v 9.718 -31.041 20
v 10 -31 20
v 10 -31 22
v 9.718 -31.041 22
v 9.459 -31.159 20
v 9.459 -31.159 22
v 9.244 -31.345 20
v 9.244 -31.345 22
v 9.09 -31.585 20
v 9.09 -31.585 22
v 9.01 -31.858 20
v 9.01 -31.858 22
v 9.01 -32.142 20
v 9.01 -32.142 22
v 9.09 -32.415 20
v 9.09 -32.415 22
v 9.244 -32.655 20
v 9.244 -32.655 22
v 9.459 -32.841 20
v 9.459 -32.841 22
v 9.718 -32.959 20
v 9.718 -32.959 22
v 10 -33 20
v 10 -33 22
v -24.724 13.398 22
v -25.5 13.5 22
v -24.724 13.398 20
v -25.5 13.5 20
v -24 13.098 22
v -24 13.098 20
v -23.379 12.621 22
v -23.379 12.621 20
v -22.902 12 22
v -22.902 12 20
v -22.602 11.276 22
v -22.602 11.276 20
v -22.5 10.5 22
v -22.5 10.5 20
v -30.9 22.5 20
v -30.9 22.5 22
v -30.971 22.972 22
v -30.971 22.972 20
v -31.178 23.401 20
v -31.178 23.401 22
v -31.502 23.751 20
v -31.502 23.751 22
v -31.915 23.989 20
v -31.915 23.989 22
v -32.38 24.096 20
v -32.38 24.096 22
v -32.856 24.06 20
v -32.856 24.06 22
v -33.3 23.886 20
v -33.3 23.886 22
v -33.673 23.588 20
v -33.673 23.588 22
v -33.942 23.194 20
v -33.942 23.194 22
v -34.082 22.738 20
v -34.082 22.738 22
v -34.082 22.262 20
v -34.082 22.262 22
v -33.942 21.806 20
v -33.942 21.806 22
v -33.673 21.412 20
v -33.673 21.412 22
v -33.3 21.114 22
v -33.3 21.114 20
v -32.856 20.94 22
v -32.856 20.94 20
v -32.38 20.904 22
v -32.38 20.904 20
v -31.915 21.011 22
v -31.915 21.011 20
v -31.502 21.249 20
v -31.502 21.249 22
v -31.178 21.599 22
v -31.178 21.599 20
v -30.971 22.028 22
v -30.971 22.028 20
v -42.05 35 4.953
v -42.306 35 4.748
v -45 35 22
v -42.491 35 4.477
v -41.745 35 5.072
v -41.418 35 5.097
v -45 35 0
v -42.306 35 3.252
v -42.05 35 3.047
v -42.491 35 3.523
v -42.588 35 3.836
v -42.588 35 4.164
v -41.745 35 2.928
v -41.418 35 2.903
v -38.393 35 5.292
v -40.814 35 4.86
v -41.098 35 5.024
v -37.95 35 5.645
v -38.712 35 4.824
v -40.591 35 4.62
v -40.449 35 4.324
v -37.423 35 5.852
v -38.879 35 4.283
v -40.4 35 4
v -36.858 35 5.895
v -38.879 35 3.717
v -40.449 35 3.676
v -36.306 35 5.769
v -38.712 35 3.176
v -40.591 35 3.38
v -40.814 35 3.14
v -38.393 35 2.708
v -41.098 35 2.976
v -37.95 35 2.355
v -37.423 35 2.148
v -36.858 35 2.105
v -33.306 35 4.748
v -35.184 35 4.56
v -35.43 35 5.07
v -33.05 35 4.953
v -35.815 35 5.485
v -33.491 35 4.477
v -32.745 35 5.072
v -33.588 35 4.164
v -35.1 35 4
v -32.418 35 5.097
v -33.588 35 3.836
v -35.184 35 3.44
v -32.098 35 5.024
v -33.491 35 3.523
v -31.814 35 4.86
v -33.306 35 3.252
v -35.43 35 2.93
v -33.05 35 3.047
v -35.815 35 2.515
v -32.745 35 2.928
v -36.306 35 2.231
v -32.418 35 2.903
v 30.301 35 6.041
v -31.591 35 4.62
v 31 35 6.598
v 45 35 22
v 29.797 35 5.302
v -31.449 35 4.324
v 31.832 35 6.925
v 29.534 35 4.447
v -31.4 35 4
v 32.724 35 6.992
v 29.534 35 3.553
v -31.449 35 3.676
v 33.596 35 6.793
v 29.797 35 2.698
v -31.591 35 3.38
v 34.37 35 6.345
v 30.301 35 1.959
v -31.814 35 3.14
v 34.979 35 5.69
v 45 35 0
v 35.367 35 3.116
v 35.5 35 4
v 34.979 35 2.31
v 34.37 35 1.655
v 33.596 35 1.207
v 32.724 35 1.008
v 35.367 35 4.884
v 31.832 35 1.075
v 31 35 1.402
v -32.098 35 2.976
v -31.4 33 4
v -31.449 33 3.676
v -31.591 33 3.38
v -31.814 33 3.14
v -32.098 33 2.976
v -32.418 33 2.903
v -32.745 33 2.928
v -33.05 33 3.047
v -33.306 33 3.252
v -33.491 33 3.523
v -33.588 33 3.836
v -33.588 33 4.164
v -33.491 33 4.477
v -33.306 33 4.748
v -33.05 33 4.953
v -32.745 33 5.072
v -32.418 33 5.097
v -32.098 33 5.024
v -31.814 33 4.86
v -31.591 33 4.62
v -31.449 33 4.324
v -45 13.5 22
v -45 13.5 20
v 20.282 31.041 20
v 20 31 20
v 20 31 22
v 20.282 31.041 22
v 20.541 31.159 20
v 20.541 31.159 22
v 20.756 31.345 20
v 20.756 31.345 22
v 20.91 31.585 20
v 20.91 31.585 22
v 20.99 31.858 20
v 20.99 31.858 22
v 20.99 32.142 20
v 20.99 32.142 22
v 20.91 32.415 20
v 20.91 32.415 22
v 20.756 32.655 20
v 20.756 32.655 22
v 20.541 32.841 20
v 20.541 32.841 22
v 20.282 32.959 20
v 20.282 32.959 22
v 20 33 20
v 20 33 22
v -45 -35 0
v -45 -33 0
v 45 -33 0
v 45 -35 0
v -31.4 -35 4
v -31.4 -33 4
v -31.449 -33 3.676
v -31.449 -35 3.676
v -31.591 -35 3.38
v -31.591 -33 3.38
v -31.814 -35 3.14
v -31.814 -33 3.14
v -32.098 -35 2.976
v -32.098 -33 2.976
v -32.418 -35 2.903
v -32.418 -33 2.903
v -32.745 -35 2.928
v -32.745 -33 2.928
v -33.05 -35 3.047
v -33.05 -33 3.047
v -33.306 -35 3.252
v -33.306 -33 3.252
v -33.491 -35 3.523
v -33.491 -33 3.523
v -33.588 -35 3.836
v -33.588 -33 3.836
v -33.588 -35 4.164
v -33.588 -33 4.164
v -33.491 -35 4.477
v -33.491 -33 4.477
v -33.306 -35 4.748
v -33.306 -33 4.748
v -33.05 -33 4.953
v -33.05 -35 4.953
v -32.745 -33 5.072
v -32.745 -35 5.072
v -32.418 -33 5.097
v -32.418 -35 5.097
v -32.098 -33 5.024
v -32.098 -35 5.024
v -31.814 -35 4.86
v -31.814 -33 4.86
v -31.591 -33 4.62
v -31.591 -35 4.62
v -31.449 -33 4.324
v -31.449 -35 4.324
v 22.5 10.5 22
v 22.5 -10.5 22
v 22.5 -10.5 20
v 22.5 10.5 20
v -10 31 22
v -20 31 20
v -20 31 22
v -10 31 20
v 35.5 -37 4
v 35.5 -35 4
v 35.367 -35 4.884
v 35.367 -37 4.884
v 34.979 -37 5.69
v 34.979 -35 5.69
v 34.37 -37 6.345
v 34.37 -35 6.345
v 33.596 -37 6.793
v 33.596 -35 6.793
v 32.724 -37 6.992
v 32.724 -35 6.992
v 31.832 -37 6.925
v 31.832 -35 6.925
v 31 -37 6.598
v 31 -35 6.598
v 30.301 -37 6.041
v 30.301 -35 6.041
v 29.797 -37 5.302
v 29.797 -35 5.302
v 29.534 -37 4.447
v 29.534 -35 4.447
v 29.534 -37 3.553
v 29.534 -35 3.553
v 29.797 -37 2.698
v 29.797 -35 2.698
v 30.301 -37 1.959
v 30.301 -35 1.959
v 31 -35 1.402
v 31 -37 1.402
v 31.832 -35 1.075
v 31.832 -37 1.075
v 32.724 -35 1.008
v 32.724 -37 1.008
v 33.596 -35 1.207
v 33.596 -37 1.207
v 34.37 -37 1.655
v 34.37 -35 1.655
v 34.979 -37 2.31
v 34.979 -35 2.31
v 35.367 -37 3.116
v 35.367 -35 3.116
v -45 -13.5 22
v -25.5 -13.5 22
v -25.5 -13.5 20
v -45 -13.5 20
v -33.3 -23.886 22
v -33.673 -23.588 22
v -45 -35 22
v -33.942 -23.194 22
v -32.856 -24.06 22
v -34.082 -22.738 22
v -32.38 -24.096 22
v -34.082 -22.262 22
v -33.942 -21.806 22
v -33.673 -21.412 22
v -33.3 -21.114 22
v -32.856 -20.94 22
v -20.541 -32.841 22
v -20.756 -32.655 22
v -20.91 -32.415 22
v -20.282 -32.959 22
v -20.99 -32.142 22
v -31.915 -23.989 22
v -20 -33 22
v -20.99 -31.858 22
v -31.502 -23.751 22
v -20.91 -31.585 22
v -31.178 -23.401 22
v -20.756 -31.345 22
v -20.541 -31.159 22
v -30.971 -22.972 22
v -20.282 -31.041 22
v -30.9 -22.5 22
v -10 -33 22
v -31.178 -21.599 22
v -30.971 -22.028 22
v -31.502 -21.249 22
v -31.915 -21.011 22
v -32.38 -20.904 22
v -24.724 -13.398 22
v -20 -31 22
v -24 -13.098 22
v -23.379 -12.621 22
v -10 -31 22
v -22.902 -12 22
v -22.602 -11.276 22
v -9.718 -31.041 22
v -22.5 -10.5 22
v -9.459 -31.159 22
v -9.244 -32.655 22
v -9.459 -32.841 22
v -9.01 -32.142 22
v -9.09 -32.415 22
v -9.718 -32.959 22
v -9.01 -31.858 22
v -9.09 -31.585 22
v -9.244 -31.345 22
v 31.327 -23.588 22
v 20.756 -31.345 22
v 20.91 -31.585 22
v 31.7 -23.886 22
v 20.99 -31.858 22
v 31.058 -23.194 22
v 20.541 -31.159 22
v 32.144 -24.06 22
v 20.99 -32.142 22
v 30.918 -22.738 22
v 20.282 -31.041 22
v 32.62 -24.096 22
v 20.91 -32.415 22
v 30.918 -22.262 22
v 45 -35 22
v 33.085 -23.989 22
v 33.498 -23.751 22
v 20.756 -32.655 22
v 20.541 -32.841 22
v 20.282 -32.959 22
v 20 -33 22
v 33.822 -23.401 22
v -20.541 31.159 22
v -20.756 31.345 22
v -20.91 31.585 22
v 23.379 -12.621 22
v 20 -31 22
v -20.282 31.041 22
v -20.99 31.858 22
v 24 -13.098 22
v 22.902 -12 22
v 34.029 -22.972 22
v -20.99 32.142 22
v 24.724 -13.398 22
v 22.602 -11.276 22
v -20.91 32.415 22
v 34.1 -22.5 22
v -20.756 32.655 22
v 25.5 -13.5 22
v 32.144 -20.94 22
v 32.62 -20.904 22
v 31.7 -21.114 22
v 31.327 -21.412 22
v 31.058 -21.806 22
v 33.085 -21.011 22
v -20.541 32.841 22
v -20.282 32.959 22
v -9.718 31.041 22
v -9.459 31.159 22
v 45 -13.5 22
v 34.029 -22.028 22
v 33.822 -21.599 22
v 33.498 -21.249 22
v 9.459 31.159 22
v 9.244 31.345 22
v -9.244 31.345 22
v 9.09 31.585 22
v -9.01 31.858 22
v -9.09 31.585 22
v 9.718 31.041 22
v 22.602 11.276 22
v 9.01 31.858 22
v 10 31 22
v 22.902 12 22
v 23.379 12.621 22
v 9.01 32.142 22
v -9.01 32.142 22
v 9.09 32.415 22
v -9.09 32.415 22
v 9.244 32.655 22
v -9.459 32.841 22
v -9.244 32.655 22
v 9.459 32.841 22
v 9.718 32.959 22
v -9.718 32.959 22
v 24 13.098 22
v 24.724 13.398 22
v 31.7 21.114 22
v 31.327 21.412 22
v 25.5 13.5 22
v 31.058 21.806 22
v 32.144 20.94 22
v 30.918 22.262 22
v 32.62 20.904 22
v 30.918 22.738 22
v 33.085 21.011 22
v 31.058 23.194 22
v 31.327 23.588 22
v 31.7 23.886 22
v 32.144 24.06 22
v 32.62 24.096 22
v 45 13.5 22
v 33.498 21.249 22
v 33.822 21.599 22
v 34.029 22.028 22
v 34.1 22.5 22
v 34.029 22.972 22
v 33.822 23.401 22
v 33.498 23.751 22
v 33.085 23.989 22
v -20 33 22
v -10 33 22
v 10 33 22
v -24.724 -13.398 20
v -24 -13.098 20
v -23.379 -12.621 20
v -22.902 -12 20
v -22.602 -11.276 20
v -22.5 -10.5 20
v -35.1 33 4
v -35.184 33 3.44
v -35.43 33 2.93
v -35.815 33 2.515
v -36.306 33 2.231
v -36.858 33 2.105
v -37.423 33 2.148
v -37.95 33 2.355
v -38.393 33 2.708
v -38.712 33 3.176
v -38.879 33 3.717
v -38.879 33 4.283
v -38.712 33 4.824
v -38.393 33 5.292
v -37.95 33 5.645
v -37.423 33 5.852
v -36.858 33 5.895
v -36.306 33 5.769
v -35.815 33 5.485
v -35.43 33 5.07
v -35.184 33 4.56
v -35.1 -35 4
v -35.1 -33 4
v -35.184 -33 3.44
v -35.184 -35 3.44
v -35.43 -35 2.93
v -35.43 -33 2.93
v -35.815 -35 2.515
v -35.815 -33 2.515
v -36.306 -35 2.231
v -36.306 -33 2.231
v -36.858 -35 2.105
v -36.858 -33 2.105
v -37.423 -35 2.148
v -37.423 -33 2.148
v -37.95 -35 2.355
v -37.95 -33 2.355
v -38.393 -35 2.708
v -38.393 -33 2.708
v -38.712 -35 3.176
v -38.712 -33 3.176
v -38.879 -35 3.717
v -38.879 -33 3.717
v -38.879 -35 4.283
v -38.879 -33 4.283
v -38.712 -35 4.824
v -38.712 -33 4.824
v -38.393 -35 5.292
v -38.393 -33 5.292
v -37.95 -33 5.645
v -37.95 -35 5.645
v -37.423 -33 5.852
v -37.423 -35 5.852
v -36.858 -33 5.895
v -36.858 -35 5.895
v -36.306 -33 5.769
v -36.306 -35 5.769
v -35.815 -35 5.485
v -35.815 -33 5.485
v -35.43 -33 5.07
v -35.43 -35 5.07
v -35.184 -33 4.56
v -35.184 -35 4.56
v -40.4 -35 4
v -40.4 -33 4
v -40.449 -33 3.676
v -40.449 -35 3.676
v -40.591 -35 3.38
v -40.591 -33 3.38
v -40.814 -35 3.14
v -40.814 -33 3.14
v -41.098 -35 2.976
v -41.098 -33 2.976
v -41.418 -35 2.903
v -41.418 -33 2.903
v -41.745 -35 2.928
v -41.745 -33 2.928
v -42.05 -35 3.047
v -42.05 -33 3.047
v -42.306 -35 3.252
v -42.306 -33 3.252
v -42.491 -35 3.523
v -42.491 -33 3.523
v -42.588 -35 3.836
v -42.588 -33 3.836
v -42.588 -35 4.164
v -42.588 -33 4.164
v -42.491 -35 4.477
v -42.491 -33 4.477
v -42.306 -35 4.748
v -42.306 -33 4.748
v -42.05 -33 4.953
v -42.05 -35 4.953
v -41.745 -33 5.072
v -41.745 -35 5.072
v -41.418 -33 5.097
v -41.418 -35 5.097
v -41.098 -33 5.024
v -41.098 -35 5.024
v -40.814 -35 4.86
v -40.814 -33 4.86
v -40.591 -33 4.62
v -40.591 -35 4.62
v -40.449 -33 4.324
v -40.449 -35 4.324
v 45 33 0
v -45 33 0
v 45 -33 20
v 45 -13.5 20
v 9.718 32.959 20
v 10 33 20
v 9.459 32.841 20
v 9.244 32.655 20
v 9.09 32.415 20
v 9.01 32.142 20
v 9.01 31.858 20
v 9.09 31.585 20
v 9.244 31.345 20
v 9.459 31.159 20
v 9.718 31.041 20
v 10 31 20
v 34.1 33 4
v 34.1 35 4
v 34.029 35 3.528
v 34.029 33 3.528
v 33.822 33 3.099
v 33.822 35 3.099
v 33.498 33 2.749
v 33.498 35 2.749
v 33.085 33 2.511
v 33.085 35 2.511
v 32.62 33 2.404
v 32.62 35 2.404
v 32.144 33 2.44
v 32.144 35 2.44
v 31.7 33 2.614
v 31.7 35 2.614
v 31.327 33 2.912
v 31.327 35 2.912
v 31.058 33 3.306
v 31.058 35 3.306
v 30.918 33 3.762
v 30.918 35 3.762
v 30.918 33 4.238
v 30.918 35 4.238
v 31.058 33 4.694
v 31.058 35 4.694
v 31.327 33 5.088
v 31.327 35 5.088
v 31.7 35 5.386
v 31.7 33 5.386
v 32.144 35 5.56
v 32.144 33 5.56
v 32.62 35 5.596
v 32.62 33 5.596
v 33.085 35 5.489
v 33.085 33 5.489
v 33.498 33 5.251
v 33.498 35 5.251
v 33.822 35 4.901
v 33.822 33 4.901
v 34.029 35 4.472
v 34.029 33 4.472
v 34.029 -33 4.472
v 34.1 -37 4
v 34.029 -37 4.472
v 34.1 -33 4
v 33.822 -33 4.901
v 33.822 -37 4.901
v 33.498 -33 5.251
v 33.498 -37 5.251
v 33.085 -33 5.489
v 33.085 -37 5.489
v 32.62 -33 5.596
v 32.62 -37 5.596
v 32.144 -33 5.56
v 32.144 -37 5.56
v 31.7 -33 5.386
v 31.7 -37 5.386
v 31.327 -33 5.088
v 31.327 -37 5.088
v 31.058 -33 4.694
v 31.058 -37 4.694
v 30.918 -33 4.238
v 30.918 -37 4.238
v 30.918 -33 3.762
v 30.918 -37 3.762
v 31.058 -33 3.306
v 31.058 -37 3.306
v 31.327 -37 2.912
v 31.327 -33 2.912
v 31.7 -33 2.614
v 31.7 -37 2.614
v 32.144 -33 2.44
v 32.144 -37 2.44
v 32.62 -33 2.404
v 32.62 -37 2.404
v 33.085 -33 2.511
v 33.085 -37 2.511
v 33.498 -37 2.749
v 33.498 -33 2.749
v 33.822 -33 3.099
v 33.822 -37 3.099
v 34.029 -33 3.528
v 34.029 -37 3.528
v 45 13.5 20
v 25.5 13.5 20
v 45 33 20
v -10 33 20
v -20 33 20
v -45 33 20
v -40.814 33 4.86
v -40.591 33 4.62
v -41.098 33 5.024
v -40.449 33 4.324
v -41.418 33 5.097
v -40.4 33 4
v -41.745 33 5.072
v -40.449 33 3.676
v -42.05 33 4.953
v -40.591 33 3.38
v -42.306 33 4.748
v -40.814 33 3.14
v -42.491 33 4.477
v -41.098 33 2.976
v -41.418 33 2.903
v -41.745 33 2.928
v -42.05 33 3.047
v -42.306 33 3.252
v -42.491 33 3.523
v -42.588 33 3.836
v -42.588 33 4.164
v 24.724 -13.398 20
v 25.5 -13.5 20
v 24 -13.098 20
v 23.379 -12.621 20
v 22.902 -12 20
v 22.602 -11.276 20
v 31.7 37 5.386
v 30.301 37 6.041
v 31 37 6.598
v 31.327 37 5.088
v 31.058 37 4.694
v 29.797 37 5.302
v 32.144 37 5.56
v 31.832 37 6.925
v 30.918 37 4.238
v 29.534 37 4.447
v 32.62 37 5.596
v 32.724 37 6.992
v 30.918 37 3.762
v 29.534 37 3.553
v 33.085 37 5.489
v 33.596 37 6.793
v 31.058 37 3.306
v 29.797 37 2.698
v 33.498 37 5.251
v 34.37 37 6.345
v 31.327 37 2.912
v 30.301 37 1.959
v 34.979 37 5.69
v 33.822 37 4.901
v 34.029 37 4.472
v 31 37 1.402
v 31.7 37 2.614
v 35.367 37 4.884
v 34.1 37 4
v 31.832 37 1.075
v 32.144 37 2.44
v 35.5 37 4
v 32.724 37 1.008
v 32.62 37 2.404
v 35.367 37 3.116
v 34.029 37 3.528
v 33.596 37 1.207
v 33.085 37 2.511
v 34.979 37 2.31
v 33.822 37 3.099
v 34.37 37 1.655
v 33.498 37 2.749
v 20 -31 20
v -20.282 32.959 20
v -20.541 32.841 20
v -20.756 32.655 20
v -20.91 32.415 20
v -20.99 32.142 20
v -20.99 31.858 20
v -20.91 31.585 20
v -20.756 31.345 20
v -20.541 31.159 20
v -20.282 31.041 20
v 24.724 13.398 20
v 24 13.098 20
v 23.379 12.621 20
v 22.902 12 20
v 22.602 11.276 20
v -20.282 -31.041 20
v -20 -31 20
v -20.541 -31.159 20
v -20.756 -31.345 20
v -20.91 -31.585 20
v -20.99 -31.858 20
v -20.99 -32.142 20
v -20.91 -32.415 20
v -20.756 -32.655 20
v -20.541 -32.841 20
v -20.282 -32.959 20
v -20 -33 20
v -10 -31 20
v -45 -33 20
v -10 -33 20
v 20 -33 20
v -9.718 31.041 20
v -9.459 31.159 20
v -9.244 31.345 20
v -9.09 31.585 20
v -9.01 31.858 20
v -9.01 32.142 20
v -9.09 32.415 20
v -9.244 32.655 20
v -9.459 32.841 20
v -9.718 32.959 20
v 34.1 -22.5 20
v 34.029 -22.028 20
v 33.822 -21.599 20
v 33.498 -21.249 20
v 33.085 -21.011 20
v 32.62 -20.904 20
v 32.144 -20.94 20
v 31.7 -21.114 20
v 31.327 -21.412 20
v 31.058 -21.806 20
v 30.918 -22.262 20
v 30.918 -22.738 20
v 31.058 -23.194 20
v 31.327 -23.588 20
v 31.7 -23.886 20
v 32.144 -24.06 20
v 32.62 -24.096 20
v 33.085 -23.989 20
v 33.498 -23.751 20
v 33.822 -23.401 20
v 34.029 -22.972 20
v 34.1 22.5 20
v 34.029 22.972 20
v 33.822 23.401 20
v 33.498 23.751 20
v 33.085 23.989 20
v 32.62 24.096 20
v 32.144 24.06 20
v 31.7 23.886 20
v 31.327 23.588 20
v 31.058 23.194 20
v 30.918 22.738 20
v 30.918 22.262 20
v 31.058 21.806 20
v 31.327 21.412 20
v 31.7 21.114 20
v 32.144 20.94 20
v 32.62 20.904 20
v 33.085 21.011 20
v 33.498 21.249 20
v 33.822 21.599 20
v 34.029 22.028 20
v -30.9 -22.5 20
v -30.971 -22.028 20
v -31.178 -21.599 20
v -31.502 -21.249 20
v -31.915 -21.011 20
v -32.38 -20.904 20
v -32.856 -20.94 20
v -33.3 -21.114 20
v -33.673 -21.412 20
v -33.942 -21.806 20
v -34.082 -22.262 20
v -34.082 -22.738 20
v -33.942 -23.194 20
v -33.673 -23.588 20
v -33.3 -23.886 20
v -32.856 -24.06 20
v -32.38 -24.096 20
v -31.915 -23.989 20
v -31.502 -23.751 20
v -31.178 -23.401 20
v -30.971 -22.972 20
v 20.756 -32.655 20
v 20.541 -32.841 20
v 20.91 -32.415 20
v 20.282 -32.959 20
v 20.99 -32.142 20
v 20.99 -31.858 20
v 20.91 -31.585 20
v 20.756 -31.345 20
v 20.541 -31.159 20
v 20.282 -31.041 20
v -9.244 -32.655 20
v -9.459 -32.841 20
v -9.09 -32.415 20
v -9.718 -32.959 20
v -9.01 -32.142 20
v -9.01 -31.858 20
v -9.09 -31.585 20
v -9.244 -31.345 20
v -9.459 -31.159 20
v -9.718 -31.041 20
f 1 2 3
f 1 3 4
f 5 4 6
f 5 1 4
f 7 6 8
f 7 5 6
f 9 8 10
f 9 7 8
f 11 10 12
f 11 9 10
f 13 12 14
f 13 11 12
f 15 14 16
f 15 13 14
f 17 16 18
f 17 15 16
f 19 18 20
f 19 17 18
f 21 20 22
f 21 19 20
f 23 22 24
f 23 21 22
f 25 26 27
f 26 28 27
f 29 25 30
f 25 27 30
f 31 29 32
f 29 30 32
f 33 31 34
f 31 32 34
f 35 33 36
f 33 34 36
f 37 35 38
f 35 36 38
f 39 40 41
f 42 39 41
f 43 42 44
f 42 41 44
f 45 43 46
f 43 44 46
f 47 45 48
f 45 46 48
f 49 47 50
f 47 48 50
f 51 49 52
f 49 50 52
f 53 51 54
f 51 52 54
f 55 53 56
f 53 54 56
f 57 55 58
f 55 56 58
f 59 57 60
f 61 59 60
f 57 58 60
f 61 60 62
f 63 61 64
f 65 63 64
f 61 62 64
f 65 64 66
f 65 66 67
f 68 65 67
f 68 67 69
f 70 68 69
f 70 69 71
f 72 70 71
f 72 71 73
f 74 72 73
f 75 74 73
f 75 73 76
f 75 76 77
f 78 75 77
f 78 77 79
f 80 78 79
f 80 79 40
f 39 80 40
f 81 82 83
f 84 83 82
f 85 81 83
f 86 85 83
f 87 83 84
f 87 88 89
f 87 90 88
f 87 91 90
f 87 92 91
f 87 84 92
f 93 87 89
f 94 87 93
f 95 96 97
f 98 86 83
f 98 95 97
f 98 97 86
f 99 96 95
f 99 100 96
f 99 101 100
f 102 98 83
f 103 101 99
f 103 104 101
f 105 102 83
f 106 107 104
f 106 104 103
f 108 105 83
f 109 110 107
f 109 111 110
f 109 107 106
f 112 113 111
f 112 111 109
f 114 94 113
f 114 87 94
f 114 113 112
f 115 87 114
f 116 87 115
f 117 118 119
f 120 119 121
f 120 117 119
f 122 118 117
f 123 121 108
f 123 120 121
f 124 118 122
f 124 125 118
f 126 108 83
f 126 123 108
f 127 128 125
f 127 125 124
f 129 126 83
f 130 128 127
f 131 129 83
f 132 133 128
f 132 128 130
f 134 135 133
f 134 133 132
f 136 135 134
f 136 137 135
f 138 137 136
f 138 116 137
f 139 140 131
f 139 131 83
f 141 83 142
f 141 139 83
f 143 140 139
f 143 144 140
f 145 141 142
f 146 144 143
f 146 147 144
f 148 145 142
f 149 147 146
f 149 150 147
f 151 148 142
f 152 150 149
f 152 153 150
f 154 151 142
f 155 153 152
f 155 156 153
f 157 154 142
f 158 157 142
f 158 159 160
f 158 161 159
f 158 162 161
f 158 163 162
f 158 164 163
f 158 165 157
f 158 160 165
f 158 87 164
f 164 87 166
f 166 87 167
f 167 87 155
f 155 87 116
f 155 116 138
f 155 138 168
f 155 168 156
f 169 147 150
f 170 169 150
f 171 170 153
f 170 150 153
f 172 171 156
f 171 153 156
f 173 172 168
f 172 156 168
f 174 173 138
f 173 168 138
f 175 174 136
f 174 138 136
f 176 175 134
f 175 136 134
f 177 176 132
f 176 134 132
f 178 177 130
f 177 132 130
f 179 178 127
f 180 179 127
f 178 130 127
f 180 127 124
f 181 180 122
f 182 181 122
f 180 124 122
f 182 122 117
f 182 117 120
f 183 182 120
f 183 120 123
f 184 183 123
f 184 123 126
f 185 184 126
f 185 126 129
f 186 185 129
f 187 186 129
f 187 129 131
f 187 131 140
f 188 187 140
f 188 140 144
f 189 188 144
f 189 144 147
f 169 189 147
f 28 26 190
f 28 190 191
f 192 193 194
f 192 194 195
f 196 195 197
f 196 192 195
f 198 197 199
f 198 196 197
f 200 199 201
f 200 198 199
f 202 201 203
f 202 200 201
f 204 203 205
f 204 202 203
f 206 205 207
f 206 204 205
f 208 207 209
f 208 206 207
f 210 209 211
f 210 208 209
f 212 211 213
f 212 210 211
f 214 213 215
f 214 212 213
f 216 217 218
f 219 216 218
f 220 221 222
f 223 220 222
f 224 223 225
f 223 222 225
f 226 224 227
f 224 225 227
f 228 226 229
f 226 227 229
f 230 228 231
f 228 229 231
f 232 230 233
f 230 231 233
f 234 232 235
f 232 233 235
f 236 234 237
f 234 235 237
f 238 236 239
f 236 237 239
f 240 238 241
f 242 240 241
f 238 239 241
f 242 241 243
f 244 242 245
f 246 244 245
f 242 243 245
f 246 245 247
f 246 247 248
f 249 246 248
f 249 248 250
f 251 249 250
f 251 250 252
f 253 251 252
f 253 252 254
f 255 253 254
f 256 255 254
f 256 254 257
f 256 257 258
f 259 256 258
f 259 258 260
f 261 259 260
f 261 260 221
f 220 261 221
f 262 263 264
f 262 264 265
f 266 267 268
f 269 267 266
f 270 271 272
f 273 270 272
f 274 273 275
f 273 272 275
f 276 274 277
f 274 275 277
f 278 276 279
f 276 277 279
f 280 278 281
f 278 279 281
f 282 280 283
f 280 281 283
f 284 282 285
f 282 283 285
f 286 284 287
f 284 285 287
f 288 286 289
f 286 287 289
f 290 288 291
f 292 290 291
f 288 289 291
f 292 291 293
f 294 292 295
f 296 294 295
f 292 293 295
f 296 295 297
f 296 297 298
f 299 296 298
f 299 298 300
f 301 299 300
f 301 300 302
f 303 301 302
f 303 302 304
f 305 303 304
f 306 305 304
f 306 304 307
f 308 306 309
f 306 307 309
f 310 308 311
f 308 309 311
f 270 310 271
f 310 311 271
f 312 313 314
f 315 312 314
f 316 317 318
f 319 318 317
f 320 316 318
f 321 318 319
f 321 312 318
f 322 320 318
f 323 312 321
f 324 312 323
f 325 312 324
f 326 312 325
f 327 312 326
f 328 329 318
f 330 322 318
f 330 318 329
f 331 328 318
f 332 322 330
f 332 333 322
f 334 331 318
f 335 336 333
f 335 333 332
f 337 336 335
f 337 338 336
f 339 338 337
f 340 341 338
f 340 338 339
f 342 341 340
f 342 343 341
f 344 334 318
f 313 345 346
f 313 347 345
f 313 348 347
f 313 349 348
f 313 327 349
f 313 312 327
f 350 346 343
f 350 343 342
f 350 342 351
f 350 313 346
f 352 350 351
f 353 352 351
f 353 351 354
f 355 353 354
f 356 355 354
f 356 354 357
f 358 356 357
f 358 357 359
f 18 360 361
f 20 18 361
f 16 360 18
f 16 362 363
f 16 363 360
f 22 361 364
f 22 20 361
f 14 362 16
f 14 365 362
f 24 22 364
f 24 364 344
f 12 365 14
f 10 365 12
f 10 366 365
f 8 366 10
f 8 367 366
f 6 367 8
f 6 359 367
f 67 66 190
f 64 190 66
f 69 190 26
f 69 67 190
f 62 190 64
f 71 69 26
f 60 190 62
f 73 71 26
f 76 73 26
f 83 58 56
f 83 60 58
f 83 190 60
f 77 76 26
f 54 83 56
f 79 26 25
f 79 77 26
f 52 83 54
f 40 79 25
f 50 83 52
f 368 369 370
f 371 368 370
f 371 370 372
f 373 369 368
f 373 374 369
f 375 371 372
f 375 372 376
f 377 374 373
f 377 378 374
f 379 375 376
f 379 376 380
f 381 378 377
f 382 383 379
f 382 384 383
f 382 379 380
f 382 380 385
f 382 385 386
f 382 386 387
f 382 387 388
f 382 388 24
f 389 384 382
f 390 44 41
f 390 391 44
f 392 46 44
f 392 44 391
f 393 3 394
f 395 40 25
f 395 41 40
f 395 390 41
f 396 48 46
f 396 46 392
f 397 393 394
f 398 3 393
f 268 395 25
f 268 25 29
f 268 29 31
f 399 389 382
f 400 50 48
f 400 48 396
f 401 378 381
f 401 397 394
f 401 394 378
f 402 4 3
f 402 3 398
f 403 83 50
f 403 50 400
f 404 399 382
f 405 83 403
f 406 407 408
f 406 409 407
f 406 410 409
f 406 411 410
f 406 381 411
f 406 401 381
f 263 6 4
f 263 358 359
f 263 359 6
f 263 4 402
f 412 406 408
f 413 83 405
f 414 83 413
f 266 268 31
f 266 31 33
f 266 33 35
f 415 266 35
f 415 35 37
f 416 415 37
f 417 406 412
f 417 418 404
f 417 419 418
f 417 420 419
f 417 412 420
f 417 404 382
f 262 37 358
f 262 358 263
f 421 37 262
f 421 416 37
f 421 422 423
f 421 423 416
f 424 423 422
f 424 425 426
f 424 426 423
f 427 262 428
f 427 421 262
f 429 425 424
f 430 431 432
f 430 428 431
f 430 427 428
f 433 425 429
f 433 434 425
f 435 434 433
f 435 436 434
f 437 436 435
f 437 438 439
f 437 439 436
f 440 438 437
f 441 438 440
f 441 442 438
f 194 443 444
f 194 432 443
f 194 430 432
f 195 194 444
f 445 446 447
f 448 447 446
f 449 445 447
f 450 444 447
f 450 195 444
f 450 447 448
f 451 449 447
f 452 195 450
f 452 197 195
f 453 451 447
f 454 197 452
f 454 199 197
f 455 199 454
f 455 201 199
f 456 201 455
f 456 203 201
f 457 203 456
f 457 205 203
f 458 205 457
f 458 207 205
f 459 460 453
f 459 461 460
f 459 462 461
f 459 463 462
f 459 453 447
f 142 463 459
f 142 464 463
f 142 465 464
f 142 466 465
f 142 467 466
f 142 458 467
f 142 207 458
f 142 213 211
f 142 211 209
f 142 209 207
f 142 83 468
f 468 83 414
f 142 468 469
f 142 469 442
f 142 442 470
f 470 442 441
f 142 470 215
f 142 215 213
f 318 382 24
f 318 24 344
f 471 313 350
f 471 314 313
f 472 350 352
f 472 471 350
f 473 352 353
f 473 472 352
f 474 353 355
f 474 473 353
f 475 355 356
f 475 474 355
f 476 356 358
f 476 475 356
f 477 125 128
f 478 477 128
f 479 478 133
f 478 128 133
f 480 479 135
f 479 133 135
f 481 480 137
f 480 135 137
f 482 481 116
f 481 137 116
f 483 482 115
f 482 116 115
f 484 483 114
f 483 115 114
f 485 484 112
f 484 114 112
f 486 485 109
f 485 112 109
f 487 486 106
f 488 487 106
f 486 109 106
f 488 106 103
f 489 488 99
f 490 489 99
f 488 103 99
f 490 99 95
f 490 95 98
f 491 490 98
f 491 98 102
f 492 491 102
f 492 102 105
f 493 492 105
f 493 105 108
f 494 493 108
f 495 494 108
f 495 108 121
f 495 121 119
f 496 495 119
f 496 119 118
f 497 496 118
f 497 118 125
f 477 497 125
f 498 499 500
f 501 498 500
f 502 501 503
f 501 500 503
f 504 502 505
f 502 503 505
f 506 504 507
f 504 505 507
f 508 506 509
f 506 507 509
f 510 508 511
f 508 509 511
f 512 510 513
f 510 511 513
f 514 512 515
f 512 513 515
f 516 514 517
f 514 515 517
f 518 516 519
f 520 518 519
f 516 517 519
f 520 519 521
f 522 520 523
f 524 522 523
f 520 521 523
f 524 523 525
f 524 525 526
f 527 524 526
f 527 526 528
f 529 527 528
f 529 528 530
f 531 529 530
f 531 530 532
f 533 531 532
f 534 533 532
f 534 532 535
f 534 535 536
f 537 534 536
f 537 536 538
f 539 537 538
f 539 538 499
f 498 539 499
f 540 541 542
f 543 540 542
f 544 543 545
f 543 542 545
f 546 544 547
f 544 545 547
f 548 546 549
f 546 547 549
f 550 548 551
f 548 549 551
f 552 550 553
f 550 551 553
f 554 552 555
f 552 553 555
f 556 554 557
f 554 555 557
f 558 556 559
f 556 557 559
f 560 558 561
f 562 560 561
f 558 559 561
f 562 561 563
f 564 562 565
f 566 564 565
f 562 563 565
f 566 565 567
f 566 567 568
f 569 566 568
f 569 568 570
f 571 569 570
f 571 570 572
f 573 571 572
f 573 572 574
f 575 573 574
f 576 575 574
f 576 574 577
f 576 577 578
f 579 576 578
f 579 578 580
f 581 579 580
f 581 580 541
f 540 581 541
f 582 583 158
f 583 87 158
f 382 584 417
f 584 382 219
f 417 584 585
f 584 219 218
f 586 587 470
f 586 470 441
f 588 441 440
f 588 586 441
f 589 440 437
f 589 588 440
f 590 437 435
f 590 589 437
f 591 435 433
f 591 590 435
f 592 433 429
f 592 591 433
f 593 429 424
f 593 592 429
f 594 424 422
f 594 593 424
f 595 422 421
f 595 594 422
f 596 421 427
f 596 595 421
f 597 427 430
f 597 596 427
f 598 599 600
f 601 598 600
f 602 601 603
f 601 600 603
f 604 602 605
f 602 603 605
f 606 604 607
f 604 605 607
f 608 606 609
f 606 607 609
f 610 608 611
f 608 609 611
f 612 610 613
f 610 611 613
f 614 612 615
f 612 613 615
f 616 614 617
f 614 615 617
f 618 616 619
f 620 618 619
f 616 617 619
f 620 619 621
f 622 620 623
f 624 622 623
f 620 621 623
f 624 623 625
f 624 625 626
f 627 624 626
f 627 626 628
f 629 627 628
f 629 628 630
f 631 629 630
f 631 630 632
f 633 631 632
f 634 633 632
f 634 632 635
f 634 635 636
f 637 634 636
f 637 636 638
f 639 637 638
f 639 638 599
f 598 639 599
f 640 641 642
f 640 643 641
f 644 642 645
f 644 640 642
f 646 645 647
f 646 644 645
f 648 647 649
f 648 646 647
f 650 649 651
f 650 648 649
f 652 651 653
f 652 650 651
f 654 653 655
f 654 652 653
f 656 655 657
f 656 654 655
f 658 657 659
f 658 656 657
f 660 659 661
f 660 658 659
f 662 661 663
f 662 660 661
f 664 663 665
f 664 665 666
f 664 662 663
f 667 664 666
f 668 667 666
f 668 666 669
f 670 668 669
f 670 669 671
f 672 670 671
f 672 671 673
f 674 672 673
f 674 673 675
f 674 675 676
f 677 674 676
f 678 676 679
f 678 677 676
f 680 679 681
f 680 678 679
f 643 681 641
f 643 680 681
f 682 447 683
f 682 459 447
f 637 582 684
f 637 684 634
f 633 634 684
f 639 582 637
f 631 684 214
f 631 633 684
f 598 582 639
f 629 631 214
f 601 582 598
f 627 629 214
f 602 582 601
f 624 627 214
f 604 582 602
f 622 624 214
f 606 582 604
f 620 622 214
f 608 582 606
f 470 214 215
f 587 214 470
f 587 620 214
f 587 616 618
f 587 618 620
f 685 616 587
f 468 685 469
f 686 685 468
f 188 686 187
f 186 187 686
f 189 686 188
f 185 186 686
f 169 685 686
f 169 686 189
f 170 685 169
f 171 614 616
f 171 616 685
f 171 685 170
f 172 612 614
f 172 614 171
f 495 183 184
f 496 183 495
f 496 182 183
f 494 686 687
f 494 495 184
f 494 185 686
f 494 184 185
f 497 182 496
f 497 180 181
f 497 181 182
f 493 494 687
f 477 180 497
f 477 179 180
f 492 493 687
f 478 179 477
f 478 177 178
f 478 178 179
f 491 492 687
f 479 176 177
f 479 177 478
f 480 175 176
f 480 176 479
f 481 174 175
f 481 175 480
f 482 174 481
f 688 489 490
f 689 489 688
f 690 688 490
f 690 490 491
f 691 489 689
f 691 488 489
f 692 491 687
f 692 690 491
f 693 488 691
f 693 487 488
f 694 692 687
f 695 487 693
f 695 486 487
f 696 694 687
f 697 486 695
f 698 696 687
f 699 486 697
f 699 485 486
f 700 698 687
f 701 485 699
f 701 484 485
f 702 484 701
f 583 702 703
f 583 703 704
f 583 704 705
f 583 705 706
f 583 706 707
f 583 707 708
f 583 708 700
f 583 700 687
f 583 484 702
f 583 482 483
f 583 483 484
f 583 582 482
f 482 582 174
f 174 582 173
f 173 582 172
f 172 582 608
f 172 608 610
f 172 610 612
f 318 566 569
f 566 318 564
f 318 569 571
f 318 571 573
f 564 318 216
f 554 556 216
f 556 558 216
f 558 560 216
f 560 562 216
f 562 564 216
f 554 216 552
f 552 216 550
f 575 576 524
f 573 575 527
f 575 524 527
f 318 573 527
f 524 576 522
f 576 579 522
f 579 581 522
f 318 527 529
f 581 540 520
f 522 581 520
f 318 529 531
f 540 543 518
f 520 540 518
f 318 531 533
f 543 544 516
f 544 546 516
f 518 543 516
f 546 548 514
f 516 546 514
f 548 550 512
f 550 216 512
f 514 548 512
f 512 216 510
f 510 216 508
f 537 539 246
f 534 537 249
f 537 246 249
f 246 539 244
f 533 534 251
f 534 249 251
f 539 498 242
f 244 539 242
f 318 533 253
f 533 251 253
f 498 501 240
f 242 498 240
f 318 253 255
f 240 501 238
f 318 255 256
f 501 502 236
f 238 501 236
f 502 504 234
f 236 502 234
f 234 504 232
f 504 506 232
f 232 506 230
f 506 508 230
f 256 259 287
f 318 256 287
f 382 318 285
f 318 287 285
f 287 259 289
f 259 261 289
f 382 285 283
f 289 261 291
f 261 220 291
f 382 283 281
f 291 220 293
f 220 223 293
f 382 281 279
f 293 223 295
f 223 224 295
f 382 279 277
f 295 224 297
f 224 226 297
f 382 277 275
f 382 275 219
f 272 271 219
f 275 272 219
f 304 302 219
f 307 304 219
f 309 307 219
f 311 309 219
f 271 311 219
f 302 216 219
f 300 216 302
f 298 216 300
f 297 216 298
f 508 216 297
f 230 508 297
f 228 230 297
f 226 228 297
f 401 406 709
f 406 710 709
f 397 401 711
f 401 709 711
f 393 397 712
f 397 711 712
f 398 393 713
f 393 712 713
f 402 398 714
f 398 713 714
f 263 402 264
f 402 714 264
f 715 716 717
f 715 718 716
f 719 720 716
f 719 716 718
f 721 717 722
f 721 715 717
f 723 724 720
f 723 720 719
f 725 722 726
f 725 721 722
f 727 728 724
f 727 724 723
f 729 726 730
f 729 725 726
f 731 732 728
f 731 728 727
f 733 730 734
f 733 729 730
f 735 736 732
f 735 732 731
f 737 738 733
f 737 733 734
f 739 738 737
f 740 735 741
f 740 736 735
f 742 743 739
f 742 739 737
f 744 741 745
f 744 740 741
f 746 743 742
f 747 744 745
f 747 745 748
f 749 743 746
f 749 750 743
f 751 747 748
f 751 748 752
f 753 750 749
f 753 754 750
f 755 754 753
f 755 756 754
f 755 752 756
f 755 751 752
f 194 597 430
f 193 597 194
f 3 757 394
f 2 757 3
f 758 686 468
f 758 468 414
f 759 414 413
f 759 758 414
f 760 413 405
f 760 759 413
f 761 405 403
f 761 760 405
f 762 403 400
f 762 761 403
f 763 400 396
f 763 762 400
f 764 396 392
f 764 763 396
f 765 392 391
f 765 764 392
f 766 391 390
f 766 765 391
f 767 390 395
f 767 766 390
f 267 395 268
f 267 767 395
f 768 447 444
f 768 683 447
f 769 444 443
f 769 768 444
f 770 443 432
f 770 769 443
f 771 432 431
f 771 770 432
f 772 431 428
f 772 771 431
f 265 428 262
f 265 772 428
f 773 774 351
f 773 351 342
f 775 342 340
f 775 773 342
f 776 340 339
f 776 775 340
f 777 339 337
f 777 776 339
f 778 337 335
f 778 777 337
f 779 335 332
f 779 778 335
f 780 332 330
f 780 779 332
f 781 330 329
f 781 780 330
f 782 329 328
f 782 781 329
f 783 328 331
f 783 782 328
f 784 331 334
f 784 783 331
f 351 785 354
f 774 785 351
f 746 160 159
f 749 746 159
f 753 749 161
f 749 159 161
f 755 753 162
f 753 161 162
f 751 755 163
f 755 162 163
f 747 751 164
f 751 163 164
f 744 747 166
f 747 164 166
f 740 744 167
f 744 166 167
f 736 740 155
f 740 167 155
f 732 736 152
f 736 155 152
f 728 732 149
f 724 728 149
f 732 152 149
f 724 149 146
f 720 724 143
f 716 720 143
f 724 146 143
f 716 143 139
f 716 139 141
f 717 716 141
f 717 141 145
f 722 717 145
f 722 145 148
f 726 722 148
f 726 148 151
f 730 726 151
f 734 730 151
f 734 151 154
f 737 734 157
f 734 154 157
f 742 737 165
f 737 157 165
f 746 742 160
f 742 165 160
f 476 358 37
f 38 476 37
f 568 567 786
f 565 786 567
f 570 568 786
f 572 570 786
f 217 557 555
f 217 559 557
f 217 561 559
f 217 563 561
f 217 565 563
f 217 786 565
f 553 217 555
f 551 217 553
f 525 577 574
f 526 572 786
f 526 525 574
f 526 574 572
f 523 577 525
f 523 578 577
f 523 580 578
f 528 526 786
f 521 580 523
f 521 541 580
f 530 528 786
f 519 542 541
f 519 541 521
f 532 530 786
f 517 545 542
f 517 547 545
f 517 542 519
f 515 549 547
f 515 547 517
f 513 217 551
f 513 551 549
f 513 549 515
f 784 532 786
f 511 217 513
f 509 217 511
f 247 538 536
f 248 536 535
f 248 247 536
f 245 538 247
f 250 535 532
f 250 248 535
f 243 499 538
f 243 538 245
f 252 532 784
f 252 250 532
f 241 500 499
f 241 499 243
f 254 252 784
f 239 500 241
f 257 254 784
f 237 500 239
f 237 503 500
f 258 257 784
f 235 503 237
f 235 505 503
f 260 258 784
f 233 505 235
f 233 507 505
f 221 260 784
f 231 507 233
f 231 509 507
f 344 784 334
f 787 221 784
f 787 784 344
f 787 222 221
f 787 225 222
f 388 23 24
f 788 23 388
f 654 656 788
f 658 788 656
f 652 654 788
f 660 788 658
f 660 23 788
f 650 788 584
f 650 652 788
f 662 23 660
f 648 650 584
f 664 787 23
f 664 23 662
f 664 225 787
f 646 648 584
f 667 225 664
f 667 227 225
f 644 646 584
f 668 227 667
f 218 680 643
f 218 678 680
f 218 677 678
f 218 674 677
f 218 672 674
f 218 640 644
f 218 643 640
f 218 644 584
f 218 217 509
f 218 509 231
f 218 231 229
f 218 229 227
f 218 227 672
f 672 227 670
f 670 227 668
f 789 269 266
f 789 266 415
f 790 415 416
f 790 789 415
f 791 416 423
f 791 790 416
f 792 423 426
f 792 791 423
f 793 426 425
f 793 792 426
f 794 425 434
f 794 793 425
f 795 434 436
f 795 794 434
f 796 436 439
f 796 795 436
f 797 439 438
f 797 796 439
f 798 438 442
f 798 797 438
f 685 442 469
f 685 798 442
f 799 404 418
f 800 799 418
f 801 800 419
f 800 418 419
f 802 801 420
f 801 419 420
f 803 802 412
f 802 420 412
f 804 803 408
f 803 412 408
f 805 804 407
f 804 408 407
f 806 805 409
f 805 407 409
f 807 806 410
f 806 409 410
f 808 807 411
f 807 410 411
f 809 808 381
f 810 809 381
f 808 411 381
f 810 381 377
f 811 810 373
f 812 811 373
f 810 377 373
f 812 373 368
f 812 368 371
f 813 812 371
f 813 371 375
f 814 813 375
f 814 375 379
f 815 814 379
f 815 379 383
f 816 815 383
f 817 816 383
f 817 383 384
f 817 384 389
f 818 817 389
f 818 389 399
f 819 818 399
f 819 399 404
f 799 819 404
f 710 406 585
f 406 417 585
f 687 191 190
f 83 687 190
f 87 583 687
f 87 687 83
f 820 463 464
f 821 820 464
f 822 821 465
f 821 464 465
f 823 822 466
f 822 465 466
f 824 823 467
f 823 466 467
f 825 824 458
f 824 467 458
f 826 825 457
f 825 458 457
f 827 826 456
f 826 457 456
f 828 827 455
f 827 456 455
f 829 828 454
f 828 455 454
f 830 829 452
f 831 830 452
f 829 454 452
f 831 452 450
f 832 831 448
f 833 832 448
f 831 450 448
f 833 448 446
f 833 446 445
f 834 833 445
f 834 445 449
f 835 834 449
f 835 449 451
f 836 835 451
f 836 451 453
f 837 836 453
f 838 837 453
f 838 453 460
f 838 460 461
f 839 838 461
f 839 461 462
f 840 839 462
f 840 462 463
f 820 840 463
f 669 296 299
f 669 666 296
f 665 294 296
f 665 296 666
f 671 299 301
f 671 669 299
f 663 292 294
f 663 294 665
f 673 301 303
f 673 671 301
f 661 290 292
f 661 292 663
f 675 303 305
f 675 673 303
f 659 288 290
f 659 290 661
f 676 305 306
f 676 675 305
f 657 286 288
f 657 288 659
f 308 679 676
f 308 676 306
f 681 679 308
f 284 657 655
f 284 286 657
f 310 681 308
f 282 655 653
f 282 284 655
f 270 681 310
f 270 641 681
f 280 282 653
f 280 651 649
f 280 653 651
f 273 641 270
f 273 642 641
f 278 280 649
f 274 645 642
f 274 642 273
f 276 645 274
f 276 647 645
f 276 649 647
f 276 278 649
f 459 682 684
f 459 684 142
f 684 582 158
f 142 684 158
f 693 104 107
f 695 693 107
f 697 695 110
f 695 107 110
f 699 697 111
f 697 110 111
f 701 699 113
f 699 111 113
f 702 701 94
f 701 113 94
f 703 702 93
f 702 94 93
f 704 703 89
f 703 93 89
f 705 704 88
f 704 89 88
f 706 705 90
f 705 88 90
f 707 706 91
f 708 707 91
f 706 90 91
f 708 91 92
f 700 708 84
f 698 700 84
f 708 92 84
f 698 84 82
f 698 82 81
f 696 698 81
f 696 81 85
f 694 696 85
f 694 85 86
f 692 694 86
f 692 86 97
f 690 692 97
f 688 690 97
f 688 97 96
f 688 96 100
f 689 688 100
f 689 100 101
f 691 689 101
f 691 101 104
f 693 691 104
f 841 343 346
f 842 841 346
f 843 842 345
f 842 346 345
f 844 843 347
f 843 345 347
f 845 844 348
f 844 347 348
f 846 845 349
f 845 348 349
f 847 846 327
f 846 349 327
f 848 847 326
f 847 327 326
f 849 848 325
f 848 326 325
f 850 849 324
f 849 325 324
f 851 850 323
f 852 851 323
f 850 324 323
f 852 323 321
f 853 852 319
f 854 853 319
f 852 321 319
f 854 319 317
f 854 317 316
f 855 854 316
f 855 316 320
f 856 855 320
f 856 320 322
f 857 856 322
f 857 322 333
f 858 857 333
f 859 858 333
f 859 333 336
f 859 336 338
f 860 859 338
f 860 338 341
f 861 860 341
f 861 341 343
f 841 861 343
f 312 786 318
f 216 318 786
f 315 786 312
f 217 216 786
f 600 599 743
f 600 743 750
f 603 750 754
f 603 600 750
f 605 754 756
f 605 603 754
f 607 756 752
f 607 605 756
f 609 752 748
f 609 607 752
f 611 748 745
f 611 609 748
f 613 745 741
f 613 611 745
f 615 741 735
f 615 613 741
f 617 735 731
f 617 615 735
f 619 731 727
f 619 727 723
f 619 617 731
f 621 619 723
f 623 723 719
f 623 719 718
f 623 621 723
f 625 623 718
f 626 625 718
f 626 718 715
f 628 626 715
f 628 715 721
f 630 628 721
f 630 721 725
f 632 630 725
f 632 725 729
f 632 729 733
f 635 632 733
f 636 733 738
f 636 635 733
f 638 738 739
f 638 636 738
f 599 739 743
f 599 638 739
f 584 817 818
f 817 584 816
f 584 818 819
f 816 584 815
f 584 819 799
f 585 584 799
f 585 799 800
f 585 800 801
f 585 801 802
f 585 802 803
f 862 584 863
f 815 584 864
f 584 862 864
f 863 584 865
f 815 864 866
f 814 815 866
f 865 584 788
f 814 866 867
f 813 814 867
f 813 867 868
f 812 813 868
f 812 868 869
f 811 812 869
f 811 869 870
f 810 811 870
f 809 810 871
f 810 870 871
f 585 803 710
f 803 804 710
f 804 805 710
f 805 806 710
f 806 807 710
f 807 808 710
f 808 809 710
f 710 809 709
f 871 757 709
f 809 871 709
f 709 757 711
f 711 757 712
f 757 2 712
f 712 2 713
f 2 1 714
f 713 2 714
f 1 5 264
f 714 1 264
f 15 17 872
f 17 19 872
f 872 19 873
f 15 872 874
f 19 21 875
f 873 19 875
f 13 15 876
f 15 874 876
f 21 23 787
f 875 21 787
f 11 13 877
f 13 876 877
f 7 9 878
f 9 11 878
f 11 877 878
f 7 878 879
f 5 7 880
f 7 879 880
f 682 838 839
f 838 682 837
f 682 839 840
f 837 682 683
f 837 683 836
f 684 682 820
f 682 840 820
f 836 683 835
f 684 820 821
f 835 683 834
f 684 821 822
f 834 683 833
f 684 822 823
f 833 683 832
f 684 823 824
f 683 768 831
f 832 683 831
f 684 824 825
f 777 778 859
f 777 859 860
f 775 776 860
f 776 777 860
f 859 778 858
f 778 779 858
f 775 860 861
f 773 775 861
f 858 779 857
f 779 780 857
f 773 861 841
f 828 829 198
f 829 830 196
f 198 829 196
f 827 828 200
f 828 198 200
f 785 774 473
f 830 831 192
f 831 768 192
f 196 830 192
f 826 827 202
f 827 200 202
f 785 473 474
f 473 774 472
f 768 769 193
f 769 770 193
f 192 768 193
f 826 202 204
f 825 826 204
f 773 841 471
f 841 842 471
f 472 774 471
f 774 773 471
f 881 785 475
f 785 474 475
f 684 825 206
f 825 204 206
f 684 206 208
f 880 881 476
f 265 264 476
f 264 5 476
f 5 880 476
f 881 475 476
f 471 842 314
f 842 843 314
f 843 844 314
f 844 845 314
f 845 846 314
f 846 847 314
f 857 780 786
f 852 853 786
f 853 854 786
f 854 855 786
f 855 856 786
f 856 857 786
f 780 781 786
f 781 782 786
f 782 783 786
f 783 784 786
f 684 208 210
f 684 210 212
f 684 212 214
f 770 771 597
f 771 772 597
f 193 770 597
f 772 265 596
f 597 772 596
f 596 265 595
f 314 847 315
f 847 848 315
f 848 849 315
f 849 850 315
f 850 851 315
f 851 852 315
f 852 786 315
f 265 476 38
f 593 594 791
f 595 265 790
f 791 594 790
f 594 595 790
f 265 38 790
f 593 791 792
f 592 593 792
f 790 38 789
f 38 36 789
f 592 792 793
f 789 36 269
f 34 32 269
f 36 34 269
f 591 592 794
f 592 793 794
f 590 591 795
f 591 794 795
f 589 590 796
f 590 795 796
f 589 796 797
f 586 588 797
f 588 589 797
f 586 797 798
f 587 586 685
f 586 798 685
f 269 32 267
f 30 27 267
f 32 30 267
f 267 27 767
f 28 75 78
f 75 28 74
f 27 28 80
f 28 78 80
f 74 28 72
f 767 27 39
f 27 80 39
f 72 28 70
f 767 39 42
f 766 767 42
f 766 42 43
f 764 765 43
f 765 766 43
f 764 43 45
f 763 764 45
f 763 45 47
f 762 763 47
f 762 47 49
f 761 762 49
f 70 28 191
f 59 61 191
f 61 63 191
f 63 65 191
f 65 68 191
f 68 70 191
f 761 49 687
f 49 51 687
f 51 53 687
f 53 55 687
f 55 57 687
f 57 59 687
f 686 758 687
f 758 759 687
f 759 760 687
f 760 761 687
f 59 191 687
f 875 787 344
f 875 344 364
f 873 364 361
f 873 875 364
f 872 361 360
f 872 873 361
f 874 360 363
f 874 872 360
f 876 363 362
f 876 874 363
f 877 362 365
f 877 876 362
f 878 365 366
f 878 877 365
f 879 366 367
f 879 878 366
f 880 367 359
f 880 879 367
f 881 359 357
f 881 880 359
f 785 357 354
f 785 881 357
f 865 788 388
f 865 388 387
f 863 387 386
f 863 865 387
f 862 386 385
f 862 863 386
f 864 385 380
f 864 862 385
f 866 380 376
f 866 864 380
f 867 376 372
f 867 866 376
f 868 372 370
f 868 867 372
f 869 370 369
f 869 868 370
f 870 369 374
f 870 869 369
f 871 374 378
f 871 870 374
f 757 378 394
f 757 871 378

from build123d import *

# Parameters (mm, degrees)
SKETCH_1_W                = 90
SKETCH_1_H                = 70
SKETCH_1_W_2              = 86
SKETCH_1_H_2              = 66
EXTRUDE_1_DEPTH           = 22
SKETCH_2_W                = 90
SKETCH_2_H                = 70
EXTRUDE_2_DEPTH           = 2
CUT_EXTRUDE_1_DEPTH       = 1
CUT_EXTRUDE_1_DEPTH_BACK  = 91
SKETCH_4_R                = 1.5
CUT_EXTRUDE_2_DEPTH       = 1
CUT_EXTRUDE_2_DEPTH_BACK  = 91
CUT_EXTRUDE_3_DEPTH       = 21
CUT_EXTRUDE_3_DEPTH_BACK  = 3
SKETCH_7_R                = 1.9
SKETCH_7_R_2              = 1.6
CUT_EXTRUDE_4_DEPTH       = 1
CUT_EXTRUDE_4_DEPTH_BACK  = 71
SKETCH_9_R                = 1.1
CUT_EXTRUDE_5_DEPTH       = 1
CUT_EXTRUDE_5_DEPTH_BACK  = 71
SKETCH_10_R               = 3
SKETCH_10_R_2             = 1.6
EXTRUDE_3_DEPTH           = 2
SKETCH_11_R               = 3
SKETCH_11_R_2             = 1.6
EXTRUDE_4_DEPTH           = 2
SKETCH_12_R               = 1.6
CUT_EXTRUDE_6_DEPTH       = 1
CUT_EXTRUDE_6_DEPTH_BACK  = 23
SKETCH_16_W               = 11
SKETCH_16_H               = 27
CUT_EXTRUDE_9_DEPTH       = 1
CUT_EXTRUDE_9_DEPTH_BACK  = 91
SKETCH_17_W               = 45
SKETCH_17_H               = 27
EXTRUDE_6_DEPTH           = 2
FILLET_1_R                = 3
CUT_EXTRUDE_10_DEPTH      = 89
CUT_EXTRUDE_10_DEPTH_BACK = 3


with BuildPart() as part:
    # Эскиз1 → Бобышка-Вытянуть1 (new body)
    with BuildSketch(Plane.XY):
        Rectangle(SKETCH_1_W, SKETCH_1_H)
        Rectangle(SKETCH_1_W_2, SKETCH_1_H_2, mode=Mode.SUBTRACT)
    extrude(amount=EXTRUDE_1_DEPTH)

    # Эскиз2 → Бобышка-Вытянуть2 (add)
    with BuildSketch(Plane.XY.offset(22)):
        Rectangle(SKETCH_2_W, SKETCH_2_H)
    extrude(amount=-EXTRUDE_2_DEPTH)

    # Эскиз3 → Вырез-Вытянуть1 (cut, two sides)
    with BuildSketch(Plane.ZY.offset(45)) as cut_extrude_1_sk:
        with BuildLine():
            Line((17, 7.5), (17, -7.5))
            ThreePointArc((17, -7.5), (11, -13.5), (5, -7.5))
            Line((5, -7.5), (5, 7.5))
            ThreePointArc((5, 7.5), (11, 13.5), (17, 7.5))
        make_face()
    extrude(amount=CUT_EXTRUDE_1_DEPTH, mode=Mode.SUBTRACT)
    extrude(cut_extrude_1_sk.sketch, amount=-CUT_EXTRUDE_1_DEPTH_BACK, mode=Mode.SUBTRACT)

    # Эскиз4 → Вырез-Вытянуть2 (cut, two sides)
    with BuildSketch(Plane.ZY.offset(45)) as cut_extrude_2_sk:
        with Locations((11, 26)):
            Circle(SKETCH_4_R)
        with Locations((11, -26)):
            Circle(SKETCH_4_R)
    extrude(amount=CUT_EXTRUDE_2_DEPTH, mode=Mode.SUBTRACT)
    extrude(cut_extrude_2_sk.sketch, amount=-CUT_EXTRUDE_2_DEPTH_BACK, mode=Mode.SUBTRACT)

    # Эскиз5 → Вырез-Вытянуть3 (cut, two sides)
    with BuildSketch(Plane(origin=(0, 0, 20), x_dir=(-1, 0, 0), z_dir=(0, 0, -1))) as cut_extrude_3_sk:
        with BuildLine():
            Line((-10, 31), (-20, 31))
            ThreePointArc((-20, 31), (-21, 32), (-20, 33))
            Line((-20, 33), (-10, 33))
            ThreePointArc((-10, 33), (-9, 32), (-10, 31))
        make_face()
        with BuildLine():
            Line((10, 33), (20, 33))
            ThreePointArc((20, 33), (21, 32), (20, 31))
            Line((20, 31), (10, 31))
            ThreePointArc((10, 31), (9, 32), (10, 33))
        make_face()
        with BuildLine():
            Line((10, -31), (20, -31))
            ThreePointArc((20, -31), (21, -32), (20, -33))
            Line((20, -33), (10, -33))
            ThreePointArc((10, -33), (9, -32), (10, -31))
        make_face()
        with BuildLine():
            Line((-10, -33), (-20, -33))
            ThreePointArc((-20, -33), (-21, -32), (-20, -31))
            Line((-20, -31), (-10, -31))
            ThreePointArc((-10, -31), (-9, -32), (-10, -33))
        make_face()
    extrude(amount=CUT_EXTRUDE_3_DEPTH, mode=Mode.SUBTRACT)
    extrude(cut_extrude_3_sk.sketch, amount=-CUT_EXTRUDE_3_DEPTH_BACK, mode=Mode.SUBTRACT)

    # Эскиз7 → Вырез-Вытянуть4 (cut, two sides)
    with BuildSketch(Plane(origin=(0, 35, 0), x_dir=(1, 0, 0), z_dir=(0, 1, 0))) as cut_extrude_4_sk:
        with Locations((-37, -4)):
            Circle(SKETCH_7_R)
        with Locations((32.5, -4)):
            Circle(SKETCH_7_R_2)
    extrude(amount=CUT_EXTRUDE_4_DEPTH, mode=Mode.SUBTRACT)
    extrude(cut_extrude_4_sk.sketch, amount=-CUT_EXTRUDE_4_DEPTH_BACK, mode=Mode.SUBTRACT)

    # Эскиз9 → Вырез-Вытянуть5 (cut, two sides)
    with BuildSketch(Plane(origin=(0, 35, 0), x_dir=(1, 0, 0), z_dir=(0, 1, 0))) as cut_extrude_5_sk:
        with Locations((-32.5, -4)):
            Circle(SKETCH_9_R)
        with Locations((-41.5, -4)):
            Circle(SKETCH_9_R)
    extrude(amount=CUT_EXTRUDE_5_DEPTH, mode=Mode.SUBTRACT)
    extrude(cut_extrude_5_sk.sketch, amount=-CUT_EXTRUDE_5_DEPTH_BACK, mode=Mode.SUBTRACT)

    # Эскиз10 → Бобышка-Вытянуть3 (add)
    with BuildSketch(Plane(origin=(0, 35, 0), x_dir=(1, 0, 0), z_dir=(0, 1, 0))):
        with Locations((32.5, -4)):
            Circle(SKETCH_10_R)
        with Locations((32.5, -4)):
            Circle(SKETCH_10_R_2, mode=Mode.SUBTRACT)
    extrude(amount=EXTRUDE_3_DEPTH)

    # Эскиз11 → Бобышка-Вытянуть4 (add)
    with BuildSketch(Plane.XZ.offset(35)):
        with Locations((32.5, 4)):
            Circle(SKETCH_11_R)
        with Locations((32.5, 4)):
            Circle(SKETCH_11_R_2, mode=Mode.SUBTRACT)
    extrude(amount=EXTRUDE_4_DEPTH)

    # Эскиз12 → Вырез-Вытянуть6 (cut, two sides)
    with BuildSketch(Plane.XY.offset(22)) as cut_extrude_6_sk:
        with Locations((-32.5, 22.5)):
            Circle(SKETCH_12_R)
        with Locations((-32.5, -22.5)):
            Circle(SKETCH_12_R)
        with Locations((32.5, -22.5)):
            Circle(SKETCH_12_R)
        with Locations((32.5, 22.5)):
            Circle(SKETCH_12_R)
    extrude(amount=CUT_EXTRUDE_6_DEPTH, mode=Mode.SUBTRACT)
    extrude(cut_extrude_6_sk.sketch, amount=-CUT_EXTRUDE_6_DEPTH_BACK, mode=Mode.SUBTRACT)

    # Эскиз16 → Вырез-Вытянуть9 (cut, two sides)
    with BuildSketch(Plane(origin=(45, 0, 0), x_dir=(0, 0, -1), z_dir=(1, 0, 0))) as cut_extrude_9_sk:
        with Locations((-16.5, 0)):
            Rectangle(SKETCH_16_W, SKETCH_16_H)
    extrude(amount=CUT_EXTRUDE_9_DEPTH, mode=Mode.SUBTRACT)
    extrude(cut_extrude_9_sk.sketch, amount=-CUT_EXTRUDE_9_DEPTH_BACK, mode=Mode.SUBTRACT)

    # Эскиз17 → Бобышка-Вытянуть6 (add)
    with BuildSketch(Plane.XY.offset(22)):
        Rectangle(SKETCH_17_W, SKETCH_17_H)
    extrude(amount=-EXTRUDE_6_DEPTH)

    # Скругление1
    fillet_1_edges = [part.edges().sort_by_distance(p)[0] for p in [
        (-22.5, -13.5, 21),
        (-22.5, 13.5, 21),
        (22.5, 13.5, 21),
        (22.5, -13.5, 21),
    ]]
    fillet(fillet_1_edges, radius=FILLET_1_R)

    # Эскиз18 → Вырез-Вытянуть10 (cut, two sides)
    with BuildSketch(Plane.ZY.offset(-43)) as cut_extrude_10_sk:
        with BuildLine():
            Line((11, 13.5), (20, 13.5))
            Line((20, 13.5), (20, 33))
            Line((20, 33), (0, 33))
            Line((0, 33), (0, -33))
            Line((0, -33), (20, -33))
            Line((20, -33), (20, -13.5))
            Line((20, -13.5), (11, -13.5))
            ThreePointArc((11, -13.5), (6.757359313, -11.742640687), (5, -7.5))
            Line((5, -7.5), (5, 7.5))
            ThreePointArc((5, 7.5), (6.757359313, 11.742640687), (11, 13.5))
        make_face()
    extrude(amount=CUT_EXTRUDE_10_DEPTH, mode=Mode.SUBTRACT)
    extrude(cut_extrude_10_sk.sketch, amount=-CUT_EXTRUDE_10_DEPTH_BACK, mode=Mode.SUBTRACT)


solid = part.part
